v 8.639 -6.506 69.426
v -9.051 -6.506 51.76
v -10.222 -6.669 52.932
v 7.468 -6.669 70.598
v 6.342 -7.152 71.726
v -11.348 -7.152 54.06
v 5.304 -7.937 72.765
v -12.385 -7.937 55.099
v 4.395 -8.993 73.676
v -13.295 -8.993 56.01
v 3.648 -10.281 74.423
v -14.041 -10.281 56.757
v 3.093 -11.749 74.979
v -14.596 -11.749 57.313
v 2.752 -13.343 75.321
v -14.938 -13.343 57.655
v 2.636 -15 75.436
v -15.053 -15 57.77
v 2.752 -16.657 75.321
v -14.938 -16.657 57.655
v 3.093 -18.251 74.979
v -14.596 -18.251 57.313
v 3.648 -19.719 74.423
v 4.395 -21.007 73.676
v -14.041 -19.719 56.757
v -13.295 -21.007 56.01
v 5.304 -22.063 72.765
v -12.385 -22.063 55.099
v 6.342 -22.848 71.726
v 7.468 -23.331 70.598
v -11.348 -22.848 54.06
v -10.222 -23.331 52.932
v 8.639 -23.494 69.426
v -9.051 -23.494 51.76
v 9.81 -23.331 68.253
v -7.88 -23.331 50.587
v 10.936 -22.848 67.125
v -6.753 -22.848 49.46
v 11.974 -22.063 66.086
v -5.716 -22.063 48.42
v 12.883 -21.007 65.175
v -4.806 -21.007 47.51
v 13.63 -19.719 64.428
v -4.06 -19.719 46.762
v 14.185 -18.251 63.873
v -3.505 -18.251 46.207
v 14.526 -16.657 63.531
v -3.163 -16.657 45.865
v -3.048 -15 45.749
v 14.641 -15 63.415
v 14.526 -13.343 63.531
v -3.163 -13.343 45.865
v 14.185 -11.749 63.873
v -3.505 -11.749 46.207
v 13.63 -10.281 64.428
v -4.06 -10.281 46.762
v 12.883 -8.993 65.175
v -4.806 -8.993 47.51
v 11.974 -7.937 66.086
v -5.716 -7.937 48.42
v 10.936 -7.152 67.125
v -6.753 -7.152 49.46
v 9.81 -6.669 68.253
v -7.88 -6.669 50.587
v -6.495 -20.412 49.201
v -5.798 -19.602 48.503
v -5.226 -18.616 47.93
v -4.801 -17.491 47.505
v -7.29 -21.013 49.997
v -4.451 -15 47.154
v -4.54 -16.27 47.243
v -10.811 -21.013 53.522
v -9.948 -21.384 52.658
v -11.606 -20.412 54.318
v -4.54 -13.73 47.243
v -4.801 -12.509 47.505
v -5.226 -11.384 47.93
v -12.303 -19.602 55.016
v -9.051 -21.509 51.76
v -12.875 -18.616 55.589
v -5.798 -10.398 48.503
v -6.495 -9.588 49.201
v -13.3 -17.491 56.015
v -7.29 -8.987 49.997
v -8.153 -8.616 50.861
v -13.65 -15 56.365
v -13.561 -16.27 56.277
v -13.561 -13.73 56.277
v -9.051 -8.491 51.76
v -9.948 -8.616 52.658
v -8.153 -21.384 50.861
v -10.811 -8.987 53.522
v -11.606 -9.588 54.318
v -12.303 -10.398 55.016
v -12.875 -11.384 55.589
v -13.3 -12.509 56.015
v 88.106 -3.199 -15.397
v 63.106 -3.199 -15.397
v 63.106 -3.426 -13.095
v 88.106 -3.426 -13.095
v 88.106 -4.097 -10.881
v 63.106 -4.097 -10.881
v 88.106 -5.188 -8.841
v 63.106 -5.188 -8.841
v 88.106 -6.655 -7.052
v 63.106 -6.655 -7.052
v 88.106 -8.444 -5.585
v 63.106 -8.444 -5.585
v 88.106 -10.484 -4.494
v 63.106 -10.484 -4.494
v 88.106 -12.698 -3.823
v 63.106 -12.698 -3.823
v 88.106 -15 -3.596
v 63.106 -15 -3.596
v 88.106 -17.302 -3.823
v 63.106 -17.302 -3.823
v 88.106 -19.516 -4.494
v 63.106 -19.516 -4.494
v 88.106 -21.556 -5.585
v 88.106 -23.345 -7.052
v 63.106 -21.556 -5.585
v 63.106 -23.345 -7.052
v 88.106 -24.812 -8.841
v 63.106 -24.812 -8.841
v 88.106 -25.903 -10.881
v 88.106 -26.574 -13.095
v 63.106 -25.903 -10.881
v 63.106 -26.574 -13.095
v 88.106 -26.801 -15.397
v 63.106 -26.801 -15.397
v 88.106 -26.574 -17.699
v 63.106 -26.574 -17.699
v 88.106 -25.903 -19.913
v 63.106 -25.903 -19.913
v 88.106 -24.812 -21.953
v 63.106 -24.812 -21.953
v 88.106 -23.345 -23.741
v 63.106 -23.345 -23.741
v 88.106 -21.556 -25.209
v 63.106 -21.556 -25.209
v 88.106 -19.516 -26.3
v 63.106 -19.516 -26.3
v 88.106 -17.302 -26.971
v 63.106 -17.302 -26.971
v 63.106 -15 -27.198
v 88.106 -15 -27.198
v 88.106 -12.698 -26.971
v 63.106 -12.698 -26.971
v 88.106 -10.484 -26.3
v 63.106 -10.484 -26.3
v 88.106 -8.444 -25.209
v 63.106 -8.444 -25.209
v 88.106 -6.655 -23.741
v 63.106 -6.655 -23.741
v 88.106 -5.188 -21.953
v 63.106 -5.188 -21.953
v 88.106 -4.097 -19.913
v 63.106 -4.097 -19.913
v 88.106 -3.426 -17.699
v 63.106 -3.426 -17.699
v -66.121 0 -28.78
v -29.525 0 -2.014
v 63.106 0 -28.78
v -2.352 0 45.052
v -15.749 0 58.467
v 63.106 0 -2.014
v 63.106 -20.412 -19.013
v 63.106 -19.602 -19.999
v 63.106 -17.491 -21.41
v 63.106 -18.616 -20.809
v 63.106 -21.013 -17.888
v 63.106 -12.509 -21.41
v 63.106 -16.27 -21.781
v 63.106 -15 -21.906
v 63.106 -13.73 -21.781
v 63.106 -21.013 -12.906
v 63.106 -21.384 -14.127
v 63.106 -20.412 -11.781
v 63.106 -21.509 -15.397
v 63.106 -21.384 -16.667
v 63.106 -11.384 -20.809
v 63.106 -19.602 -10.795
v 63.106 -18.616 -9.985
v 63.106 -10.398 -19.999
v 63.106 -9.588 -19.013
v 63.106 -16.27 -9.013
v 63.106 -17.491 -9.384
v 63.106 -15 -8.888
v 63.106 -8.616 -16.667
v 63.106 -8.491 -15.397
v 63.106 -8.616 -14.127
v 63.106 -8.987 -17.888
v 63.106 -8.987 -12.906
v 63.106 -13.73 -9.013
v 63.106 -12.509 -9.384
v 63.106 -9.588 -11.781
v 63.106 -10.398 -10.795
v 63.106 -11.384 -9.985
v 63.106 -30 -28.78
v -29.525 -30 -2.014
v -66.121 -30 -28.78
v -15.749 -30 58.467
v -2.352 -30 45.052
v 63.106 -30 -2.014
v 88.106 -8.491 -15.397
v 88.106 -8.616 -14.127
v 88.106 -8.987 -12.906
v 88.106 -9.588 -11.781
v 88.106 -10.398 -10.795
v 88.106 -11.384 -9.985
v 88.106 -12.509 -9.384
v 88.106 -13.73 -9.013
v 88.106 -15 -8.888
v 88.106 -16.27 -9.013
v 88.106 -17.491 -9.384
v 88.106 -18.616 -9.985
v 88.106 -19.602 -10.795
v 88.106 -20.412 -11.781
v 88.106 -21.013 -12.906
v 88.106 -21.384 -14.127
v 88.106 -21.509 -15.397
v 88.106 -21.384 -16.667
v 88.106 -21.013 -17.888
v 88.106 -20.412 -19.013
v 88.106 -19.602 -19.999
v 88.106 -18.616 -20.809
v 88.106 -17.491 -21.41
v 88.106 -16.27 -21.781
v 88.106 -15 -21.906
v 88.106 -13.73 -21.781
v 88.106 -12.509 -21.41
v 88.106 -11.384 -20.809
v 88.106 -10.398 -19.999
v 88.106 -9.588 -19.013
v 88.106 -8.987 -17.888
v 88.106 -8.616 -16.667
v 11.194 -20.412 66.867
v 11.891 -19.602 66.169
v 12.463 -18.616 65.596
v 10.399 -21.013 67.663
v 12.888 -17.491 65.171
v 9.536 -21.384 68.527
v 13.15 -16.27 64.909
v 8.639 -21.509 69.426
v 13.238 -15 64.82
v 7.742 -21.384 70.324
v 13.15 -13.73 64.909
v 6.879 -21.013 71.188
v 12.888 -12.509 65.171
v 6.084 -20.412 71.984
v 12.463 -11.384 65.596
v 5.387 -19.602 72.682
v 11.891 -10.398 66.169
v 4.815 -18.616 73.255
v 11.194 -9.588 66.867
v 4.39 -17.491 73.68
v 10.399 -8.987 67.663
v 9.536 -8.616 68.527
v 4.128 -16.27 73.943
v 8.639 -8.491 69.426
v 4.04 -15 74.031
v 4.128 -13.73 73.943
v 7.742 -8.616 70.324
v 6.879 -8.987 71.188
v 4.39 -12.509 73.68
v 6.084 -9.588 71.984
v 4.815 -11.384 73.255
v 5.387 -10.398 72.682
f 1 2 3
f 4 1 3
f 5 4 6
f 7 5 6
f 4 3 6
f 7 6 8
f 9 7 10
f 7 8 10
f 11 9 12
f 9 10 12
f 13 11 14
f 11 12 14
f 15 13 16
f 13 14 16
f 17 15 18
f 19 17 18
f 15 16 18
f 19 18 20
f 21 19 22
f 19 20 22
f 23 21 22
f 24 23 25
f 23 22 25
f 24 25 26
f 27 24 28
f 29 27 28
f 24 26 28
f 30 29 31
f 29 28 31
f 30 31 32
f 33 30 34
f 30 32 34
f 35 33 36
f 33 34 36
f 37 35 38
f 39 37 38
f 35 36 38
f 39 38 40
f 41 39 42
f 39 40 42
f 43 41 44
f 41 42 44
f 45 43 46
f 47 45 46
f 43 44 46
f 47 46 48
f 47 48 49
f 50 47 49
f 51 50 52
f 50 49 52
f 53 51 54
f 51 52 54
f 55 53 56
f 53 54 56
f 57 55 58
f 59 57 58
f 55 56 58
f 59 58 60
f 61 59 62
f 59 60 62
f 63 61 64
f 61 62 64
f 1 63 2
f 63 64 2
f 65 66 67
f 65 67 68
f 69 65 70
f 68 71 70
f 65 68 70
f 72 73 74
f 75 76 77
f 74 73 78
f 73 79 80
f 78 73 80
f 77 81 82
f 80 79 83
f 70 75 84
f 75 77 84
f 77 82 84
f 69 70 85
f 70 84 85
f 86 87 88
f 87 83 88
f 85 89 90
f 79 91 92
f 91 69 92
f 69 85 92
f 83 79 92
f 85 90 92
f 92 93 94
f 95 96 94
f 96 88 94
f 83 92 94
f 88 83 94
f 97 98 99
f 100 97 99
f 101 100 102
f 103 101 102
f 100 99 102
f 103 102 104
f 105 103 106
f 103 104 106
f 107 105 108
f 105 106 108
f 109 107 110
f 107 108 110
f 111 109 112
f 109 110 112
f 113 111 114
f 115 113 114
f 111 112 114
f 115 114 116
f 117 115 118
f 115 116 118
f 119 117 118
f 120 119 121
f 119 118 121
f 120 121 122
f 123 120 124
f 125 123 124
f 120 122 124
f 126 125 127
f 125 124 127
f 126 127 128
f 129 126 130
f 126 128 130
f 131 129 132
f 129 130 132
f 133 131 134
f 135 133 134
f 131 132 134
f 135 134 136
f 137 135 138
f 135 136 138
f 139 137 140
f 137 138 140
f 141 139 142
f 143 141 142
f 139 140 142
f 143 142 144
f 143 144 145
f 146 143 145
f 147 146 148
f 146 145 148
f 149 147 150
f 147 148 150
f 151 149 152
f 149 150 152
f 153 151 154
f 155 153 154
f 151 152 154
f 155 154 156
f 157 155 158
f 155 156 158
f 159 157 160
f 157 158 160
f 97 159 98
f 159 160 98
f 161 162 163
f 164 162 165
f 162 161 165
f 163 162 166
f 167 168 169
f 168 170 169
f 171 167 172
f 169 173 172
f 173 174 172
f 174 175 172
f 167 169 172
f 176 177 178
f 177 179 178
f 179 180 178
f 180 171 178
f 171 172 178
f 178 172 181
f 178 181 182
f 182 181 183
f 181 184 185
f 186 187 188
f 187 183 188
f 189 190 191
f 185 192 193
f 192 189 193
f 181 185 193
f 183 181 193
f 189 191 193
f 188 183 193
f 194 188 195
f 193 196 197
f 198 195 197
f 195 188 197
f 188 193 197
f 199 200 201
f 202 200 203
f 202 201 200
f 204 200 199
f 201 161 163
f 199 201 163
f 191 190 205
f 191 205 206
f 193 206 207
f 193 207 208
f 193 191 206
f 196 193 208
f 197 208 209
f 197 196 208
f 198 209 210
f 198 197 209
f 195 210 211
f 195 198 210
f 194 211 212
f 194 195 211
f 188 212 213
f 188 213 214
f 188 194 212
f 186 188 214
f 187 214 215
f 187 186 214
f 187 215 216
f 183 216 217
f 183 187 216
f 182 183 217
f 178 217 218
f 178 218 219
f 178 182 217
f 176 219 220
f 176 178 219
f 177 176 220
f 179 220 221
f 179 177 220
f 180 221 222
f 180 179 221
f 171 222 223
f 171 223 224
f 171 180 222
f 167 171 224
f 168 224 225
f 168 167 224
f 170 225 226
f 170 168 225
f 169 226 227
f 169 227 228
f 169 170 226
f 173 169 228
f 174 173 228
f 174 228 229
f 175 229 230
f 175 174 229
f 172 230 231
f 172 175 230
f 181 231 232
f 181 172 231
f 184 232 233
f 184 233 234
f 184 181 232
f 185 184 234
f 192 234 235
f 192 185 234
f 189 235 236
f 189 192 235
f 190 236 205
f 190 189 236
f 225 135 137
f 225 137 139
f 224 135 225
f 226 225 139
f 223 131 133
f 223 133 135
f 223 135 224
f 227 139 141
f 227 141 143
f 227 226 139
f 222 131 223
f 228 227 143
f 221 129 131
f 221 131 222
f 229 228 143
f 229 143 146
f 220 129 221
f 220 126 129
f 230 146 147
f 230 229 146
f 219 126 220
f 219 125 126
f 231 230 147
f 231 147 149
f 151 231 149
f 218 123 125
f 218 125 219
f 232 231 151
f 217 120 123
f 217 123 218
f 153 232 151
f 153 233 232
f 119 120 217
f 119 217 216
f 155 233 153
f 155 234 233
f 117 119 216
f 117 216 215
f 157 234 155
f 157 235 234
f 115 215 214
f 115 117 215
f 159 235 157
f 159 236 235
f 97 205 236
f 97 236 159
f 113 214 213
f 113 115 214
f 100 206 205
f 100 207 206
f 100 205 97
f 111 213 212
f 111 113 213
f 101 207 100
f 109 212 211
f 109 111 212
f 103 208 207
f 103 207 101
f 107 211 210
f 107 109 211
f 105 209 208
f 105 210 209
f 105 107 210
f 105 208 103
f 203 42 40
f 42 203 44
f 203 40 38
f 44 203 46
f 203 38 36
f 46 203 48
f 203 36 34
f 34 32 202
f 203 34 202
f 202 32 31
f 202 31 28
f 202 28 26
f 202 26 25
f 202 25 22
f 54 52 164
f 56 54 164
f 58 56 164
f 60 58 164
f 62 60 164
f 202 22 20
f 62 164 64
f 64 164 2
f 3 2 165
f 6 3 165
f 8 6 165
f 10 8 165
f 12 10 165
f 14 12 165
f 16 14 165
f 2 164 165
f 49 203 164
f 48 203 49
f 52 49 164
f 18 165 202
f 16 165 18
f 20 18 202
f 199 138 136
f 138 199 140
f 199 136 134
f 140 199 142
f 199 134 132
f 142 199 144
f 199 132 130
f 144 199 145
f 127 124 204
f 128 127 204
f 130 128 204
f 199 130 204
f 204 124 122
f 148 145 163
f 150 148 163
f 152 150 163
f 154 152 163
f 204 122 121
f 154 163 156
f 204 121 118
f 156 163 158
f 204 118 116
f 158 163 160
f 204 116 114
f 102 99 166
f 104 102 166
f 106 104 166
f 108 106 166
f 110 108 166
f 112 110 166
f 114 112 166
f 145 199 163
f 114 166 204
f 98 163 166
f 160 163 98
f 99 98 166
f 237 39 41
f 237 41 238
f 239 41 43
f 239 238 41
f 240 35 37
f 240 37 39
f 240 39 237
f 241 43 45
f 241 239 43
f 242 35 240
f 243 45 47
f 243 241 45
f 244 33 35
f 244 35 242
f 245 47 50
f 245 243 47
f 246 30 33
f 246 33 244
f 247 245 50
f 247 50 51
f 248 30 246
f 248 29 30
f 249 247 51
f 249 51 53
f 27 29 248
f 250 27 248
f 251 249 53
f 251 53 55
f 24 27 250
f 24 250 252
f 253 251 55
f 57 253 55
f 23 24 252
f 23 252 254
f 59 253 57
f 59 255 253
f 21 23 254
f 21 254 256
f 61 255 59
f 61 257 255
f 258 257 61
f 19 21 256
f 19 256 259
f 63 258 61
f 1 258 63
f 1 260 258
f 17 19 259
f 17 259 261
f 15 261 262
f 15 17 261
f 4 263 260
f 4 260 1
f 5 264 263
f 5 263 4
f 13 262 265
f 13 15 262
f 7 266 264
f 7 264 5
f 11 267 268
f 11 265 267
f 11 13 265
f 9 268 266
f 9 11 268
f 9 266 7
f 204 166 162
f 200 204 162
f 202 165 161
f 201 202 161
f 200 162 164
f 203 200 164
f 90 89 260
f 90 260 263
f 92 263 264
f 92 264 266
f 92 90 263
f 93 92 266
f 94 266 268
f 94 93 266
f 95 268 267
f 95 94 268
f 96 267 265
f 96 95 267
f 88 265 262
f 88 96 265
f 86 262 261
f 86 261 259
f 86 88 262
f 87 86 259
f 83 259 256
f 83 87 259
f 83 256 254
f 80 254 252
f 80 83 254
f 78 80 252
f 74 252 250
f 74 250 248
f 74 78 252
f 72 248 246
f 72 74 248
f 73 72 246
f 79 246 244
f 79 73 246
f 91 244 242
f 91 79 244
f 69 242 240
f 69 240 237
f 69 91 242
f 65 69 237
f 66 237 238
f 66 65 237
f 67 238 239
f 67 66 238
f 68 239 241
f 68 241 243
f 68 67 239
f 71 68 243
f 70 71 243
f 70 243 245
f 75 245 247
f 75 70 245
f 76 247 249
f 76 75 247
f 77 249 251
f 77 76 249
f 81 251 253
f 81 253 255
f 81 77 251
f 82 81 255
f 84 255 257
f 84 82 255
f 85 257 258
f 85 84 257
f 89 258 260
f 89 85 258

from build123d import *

# Parameters (mm, degrees)
F1_DEPTH = 30
F2_R     = 8.4944799553
F2_R_2   = 6.50875
F3_DEPTH = 25
F4_R     = 11.8009083685
F4_R_2   = 6.50875
F5_DEPTH = 25


with BuildPart() as f1:
    # F0 (on Front) → F1 (new body)
    with BuildSketch(Plane.XZ):
        Polygon((-2.3517715285, 45.0519641835), (-15.7493199024, 58.4674571651), (-66.1214962602, -28.7797115743), (63.1061792374, -28.7797115743), (63.1061792374, -2.0140784685), (-29.5253639234, -2.0140784685), align=None)
    extrude(amount=F1_DEPTH)

    # F2 (on face) → F3 (join)
    with BuildSketch(Plane(origin=(21.3485022284, 0, 21.3199464014), x_dir=(0, 1, 0), z_dir=(0.7075798534, 0, 0.7066333923))):
        with Locations((-15, 43.0195463119)):
            Circle(F2_R)
        with Locations((-15, 43.0195463119)):
            Circle(F2_R_2, mode=Mode.SUBTRACT)
    extrude(amount=F3_DEPTH)

    # F4 (on face) → F5 (join)
    with BuildSketch(Plane.YZ.offset(63.1061792374)):
        with Locations((-15, -15.3968950214)):
            Circle(F4_R)
        with Locations((-15, -15.3968950214)):
            Circle(F4_R_2, mode=Mode.SUBTRACT)
    extrude(amount=F5_DEPTH)


solid = f1.part
